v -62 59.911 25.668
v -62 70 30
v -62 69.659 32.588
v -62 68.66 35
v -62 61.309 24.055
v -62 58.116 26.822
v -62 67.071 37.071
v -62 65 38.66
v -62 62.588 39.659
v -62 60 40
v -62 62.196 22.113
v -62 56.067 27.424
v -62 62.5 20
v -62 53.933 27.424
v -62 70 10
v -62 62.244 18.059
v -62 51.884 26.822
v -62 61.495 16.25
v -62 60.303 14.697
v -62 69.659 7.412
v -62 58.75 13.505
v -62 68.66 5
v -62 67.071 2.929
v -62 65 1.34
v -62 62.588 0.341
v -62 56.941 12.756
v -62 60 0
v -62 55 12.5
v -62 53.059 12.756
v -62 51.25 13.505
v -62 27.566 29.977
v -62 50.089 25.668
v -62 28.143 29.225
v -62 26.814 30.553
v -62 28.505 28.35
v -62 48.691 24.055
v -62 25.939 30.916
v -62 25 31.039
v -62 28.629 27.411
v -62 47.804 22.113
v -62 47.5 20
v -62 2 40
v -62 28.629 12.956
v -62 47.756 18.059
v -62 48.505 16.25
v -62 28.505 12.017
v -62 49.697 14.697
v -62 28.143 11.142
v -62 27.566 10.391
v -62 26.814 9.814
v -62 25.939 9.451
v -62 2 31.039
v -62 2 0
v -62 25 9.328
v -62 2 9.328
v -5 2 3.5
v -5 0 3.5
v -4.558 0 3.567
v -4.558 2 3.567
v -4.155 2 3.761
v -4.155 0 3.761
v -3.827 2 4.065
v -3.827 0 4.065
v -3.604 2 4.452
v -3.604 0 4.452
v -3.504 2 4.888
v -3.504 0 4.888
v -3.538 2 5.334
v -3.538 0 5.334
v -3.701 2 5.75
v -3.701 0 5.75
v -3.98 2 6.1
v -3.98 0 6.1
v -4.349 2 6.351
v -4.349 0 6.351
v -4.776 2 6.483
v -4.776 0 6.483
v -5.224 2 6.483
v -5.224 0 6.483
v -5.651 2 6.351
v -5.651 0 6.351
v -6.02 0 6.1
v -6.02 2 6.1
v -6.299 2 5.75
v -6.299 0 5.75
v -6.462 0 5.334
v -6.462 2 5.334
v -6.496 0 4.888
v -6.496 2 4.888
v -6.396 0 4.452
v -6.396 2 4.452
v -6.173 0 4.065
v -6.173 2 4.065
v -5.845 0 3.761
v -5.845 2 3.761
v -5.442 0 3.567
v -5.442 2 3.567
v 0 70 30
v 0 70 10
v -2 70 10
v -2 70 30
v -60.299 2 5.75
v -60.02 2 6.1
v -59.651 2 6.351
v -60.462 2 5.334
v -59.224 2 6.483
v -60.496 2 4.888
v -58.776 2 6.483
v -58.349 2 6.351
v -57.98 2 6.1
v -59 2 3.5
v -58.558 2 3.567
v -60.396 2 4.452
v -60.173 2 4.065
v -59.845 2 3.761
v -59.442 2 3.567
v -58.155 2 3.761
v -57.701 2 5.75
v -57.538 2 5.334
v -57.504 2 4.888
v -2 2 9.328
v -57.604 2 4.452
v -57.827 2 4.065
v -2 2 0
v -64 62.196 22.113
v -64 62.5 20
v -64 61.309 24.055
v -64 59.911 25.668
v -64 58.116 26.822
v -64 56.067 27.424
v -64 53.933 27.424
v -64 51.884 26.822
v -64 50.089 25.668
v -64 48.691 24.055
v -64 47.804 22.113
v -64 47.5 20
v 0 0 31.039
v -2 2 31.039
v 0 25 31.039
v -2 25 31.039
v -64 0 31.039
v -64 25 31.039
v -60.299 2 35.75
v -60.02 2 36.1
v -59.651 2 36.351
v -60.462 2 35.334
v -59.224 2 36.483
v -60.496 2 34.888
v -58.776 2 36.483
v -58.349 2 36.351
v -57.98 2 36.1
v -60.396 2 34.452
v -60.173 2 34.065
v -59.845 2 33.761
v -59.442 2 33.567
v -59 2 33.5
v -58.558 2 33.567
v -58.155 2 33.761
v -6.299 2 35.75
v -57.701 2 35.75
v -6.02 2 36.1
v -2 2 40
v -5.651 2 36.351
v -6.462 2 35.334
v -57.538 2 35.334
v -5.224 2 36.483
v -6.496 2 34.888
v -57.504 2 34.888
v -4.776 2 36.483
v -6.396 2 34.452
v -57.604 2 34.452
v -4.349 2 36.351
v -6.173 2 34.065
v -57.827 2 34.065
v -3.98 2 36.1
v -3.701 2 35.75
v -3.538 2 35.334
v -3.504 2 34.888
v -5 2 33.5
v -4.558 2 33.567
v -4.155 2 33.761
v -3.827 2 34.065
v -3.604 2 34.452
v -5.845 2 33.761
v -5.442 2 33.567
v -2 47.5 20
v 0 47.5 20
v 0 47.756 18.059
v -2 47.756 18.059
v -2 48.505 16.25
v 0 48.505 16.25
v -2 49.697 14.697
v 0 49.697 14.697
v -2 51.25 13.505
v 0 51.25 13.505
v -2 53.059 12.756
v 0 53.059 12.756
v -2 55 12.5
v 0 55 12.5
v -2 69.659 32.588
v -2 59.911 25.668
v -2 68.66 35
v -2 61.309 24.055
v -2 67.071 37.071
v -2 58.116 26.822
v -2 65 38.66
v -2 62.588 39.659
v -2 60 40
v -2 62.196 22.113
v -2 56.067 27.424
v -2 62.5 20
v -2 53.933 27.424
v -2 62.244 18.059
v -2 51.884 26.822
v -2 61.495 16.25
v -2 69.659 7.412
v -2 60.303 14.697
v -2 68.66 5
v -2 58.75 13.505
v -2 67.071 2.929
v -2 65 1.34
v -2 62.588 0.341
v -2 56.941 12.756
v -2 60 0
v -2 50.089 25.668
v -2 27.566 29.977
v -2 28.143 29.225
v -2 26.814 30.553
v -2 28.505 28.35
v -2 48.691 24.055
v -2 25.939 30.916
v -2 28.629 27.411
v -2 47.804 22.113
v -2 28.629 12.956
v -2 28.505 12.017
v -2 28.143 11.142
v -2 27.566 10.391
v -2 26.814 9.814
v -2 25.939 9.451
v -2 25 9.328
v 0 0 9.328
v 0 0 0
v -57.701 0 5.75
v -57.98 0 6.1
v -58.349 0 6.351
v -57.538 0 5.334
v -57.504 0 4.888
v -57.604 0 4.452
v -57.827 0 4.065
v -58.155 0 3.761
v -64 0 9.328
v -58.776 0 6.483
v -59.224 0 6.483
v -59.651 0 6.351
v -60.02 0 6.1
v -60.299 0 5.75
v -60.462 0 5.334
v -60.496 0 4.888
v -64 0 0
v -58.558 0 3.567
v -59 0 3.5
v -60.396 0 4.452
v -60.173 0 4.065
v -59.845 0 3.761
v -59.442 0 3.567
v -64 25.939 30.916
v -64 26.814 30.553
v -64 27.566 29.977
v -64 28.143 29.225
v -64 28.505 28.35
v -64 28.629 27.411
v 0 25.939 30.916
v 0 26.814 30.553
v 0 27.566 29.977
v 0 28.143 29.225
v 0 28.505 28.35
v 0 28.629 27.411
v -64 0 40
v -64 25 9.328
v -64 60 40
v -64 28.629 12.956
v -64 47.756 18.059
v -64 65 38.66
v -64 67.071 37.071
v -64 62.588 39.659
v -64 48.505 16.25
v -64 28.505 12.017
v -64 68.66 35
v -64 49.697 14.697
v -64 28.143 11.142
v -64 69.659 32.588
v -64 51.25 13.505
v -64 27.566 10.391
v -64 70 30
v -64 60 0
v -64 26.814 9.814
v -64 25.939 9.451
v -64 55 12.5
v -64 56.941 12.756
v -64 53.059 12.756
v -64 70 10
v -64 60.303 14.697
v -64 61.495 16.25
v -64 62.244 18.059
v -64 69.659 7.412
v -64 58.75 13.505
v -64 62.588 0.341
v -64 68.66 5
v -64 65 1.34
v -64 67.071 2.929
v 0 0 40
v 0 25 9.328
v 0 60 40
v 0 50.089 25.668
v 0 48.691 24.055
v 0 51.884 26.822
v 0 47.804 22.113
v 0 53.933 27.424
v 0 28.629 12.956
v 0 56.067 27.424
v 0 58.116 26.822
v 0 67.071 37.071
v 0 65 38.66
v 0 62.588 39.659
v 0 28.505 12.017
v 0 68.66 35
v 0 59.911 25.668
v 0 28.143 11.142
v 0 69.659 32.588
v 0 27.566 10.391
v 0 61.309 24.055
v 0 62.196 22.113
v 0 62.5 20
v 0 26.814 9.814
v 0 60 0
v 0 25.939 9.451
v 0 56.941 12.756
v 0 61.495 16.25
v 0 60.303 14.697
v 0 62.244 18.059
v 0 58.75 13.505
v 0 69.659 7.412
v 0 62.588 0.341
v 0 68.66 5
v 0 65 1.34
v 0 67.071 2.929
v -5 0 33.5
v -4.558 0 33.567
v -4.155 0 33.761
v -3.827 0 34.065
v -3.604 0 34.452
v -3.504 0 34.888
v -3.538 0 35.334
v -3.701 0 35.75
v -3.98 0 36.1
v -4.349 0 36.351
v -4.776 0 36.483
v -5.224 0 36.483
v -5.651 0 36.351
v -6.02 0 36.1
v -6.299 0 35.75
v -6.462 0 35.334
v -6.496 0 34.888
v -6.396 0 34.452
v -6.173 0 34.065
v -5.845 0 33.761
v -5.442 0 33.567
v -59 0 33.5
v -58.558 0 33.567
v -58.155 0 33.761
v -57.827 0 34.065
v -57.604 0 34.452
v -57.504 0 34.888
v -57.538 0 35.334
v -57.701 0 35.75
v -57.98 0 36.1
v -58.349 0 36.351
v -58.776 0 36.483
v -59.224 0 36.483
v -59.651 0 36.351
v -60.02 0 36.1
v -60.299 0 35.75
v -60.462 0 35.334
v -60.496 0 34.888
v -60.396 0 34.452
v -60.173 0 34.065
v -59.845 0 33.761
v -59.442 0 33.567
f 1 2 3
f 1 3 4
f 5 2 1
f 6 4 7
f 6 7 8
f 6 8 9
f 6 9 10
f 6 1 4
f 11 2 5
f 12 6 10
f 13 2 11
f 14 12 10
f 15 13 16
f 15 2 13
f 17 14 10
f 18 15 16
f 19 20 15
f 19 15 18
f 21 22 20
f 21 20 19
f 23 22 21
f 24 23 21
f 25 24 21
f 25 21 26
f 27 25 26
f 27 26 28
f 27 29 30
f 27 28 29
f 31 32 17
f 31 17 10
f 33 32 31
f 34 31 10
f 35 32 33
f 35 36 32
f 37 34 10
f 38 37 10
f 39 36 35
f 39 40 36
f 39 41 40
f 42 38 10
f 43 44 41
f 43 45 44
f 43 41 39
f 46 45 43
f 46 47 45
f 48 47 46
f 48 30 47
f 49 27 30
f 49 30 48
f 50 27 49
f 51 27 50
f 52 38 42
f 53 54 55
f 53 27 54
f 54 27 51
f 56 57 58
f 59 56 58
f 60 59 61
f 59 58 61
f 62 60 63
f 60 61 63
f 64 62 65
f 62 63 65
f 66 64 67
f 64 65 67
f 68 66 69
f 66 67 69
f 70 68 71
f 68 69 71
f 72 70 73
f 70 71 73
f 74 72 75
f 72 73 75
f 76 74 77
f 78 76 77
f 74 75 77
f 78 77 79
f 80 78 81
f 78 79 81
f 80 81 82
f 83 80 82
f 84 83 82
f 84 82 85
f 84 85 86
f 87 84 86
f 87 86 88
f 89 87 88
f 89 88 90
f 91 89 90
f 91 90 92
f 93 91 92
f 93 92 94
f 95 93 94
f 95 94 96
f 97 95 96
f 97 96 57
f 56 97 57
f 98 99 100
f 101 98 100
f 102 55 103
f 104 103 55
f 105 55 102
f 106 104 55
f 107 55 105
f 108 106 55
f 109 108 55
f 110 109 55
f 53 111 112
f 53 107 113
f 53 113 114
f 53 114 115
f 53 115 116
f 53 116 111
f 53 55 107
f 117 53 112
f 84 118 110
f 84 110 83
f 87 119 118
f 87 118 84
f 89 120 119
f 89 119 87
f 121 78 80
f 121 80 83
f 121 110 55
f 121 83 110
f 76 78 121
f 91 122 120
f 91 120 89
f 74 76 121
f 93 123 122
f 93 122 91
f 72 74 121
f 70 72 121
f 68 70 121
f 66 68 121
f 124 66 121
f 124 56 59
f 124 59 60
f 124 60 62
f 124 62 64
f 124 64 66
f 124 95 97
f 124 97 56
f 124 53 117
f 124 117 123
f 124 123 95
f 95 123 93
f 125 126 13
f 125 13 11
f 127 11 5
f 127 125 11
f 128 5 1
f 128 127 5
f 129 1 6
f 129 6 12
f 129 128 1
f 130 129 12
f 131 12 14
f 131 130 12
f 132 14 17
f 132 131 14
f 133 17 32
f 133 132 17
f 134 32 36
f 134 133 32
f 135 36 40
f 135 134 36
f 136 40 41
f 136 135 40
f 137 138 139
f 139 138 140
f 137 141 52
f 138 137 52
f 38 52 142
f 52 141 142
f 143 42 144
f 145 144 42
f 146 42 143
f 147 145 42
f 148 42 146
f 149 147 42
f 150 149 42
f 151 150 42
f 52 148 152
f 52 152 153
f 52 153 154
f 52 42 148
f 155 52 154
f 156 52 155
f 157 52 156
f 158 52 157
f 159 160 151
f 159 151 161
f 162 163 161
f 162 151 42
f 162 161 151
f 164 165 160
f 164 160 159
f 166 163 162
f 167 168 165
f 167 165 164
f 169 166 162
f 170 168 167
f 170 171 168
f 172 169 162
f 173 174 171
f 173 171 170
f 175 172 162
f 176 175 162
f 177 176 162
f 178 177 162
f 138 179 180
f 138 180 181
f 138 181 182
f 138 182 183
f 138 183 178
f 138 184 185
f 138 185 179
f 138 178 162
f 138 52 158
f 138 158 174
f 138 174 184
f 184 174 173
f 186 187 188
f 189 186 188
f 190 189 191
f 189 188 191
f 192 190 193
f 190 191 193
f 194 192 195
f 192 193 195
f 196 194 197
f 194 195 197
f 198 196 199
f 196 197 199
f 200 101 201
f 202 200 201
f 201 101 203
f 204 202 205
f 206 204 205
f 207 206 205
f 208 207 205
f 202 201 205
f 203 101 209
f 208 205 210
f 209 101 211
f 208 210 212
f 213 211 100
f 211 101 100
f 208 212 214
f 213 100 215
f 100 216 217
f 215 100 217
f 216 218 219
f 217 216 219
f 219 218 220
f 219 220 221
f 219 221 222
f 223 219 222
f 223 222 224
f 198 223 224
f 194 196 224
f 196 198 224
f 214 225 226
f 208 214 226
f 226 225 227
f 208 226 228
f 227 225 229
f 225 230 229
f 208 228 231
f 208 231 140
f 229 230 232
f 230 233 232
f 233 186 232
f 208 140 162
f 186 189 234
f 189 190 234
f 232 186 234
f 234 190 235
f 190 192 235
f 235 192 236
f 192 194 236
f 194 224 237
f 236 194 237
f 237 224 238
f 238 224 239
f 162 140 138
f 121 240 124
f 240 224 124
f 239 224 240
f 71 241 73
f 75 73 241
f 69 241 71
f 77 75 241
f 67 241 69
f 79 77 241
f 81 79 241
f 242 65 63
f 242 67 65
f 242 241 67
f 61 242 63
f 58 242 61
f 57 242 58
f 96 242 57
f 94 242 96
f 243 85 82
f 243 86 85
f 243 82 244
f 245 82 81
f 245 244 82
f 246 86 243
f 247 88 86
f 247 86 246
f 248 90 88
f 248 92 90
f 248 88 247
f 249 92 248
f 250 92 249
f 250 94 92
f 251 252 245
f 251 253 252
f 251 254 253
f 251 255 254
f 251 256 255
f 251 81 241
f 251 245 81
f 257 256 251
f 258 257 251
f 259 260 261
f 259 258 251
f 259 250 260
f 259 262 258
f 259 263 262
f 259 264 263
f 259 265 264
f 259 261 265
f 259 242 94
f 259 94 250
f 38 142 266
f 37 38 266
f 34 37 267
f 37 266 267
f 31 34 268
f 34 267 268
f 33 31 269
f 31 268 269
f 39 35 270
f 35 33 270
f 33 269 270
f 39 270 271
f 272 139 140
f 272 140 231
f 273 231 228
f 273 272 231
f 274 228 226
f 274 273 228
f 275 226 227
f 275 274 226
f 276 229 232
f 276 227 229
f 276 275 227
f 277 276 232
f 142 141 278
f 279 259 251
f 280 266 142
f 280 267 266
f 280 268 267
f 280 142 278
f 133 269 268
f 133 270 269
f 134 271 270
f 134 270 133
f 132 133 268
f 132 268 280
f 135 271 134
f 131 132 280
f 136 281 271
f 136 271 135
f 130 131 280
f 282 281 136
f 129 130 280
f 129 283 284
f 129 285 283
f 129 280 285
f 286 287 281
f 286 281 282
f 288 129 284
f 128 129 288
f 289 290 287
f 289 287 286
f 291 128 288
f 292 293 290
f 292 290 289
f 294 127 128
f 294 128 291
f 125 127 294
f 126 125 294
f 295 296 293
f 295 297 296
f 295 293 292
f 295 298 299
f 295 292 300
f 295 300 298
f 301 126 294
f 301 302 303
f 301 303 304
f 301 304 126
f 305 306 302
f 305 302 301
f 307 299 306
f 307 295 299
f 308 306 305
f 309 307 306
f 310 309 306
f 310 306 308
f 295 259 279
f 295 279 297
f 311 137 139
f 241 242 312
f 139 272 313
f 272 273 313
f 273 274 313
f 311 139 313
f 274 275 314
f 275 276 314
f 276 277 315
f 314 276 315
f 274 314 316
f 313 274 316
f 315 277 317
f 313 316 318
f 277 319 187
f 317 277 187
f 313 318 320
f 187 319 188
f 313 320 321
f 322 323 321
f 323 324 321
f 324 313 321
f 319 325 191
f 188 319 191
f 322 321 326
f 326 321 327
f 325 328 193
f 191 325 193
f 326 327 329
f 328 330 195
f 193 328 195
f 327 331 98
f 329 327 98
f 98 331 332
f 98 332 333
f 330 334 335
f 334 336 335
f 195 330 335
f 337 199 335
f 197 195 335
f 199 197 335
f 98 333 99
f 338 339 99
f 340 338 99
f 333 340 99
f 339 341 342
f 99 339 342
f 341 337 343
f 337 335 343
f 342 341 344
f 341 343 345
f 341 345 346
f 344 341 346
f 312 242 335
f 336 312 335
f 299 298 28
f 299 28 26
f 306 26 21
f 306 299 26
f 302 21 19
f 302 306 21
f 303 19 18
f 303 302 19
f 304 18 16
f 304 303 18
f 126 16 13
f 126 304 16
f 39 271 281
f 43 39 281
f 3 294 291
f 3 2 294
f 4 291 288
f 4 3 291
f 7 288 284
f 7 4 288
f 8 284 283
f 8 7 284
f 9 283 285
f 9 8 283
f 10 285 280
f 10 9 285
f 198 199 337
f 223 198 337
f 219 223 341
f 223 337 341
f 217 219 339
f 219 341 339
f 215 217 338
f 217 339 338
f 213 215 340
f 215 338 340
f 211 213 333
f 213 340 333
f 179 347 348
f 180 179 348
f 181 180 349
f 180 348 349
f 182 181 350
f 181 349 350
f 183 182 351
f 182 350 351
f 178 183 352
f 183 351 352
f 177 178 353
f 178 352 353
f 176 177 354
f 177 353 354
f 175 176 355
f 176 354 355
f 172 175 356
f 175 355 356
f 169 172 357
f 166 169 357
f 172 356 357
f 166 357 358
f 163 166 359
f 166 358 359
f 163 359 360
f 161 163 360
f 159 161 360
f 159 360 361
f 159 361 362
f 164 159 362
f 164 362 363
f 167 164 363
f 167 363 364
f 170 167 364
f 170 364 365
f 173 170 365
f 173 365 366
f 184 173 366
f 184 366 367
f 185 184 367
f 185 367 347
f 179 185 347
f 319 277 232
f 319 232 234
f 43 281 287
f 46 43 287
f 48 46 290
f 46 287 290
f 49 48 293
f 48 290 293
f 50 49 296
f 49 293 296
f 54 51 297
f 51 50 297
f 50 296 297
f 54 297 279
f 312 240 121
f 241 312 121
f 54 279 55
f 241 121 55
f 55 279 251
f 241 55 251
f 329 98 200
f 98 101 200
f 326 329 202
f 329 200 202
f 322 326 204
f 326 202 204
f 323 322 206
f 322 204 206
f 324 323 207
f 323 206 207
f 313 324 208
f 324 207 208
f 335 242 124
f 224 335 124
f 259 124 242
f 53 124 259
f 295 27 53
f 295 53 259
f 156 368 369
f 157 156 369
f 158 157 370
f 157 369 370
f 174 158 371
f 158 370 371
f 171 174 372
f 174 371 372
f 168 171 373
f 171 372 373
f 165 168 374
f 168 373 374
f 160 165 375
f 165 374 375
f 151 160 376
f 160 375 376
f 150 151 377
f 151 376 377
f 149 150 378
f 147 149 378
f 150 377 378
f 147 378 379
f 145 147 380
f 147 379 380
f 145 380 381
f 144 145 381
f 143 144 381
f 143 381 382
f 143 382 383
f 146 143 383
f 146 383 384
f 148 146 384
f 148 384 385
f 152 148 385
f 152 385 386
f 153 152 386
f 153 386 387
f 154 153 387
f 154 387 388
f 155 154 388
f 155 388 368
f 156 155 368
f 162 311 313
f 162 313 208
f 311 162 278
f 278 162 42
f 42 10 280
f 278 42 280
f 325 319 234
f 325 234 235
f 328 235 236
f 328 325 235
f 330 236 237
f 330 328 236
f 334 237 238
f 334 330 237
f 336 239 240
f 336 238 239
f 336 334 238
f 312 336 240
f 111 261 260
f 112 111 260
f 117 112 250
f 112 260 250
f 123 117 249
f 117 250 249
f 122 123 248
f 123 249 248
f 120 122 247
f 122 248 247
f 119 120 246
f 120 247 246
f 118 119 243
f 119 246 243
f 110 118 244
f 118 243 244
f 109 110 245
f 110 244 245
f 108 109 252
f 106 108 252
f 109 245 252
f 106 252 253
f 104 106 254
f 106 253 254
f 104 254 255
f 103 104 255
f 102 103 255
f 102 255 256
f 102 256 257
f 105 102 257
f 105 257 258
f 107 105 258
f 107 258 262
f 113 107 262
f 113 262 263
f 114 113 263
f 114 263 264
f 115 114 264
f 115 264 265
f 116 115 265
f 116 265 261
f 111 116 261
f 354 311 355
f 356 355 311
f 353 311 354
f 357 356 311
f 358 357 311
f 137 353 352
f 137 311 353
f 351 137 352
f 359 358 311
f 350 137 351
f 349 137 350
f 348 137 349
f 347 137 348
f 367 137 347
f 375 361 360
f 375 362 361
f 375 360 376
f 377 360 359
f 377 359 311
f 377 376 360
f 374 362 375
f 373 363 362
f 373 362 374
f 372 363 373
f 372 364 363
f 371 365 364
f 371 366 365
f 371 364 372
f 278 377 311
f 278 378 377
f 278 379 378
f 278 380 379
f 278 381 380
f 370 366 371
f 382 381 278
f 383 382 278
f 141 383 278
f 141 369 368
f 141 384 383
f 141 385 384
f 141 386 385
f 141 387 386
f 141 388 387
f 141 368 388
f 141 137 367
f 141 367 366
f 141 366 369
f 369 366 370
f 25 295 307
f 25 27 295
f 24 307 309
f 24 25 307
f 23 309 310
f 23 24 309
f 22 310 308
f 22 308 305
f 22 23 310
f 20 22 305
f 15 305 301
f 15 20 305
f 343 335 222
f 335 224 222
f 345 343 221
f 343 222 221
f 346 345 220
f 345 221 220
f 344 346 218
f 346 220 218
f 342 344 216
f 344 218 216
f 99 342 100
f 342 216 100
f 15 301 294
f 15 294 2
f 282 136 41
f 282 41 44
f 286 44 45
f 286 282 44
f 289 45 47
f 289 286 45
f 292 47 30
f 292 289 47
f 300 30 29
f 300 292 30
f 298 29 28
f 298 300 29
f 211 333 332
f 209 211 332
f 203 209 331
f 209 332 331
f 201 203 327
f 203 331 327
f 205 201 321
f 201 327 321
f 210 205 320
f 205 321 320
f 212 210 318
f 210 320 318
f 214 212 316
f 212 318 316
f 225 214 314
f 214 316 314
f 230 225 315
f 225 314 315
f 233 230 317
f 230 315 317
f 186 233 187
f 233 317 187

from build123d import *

# Parameters (mm, degrees)
EXTRUDE_THIN1_DEPTH = 40
CUT_EXTRUDE2_DEPTH  = 60
FILLET1_R           = 10
SKETCH3_R           = 1.5
CUT_EXTRUDE4_DEPTH  = 20


with BuildPart() as part:
    # Sketch1 → Extrude-Thin1 (new body)
    with BuildSketch(Plane.XY):
        Polygon((-32, 0), (0, 0), (0, 70), (-2, 70), (-2, 2), (-32, 2), align=None)
    extrude(amount=EXTRUDE_THIN1_DEPTH)

    # Sketch2 → Cut-Extrude2 (cut)
    with BuildSketch(Plane(origin=(0, 0, 0), x_dir=(0, 0, -1), z_dir=(1, 0, 0))):
        with BuildLine():
            ThreePointArc((-20, 62.5), (-27.5, 55), (-20, 47.5))
            Line((-20, 47.5), (-20, 62.5))
        make_face()
        with BuildLine():
            Line((-20, 62.5), (-20, 47.5))
            ThreePointArc((-20, 47.5), (-14.696699141, 49.696699141), (-12.5, 55))
            ThreePointArc((-12.5, 55), (-14.696699141, 60.303300859), (-20, 62.5))
        make_face()
        with BuildLine():
            Line((-9.327670915, 25), (-9.327670915, 0))
            Line((-9.327670915, 0), (-31.039452712, 0))
            Line((-31.039452712, 0), (-31.039452712, 25))
            ThreePointArc((-31.039452712, 25), (-29.976608153, 27.56593375), (-27.410674402, 28.62877831))
            Line((-27.410674402, 28.62877831), (-12.956449225, 28.62877831))
            ThreePointArc((-12.956449225, 28.62877831), (-10.390515474, 27.56593375), (-9.327670915, 25))
        make_face()
    extrude(amount=-CUT_EXTRUDE2_DEPTH, mode=Mode.SUBTRACT)

    # Fillet1
    fillet1_edges = [part.edges().sort_by_distance(p)[0] for p in [
        (-1, 70, 0),
        (-1, 70, 40),
    ]]
    fillet(fillet1_edges, radius=FILLET1_R)

    # Mirror1: part across plane


with BuildPart() as part_1:
    add(part.part)
    add(part.part.mirror(Plane(origin=(-32, 0, 40), x_dir=(0, 0, 1), z_dir=(-1, 0, 0))))

    # Sketch3 → Cut-Extrude4 (cut)
    with BuildSketch(Plane.XZ):
        with Locations(Location((-59, 35, 0), (0, 0, 270))):
            Circle(SKETCH3_R)
        with Locations(Location((-5, 35, 0), (0, 0, 270))):
            Circle(SKETCH3_R)
        with Locations(Location((-5, 5, 0), (0, 0, 270))):
            Circle(SKETCH3_R)
        with Locations(Location((-59, 5, 0), (0, 0, 270))):
            Circle(SKETCH3_R)
    extrude(amount=-CUT_EXTRUDE4_DEPTH, mode=Mode.SUBTRACT)


solid = part_1.part
